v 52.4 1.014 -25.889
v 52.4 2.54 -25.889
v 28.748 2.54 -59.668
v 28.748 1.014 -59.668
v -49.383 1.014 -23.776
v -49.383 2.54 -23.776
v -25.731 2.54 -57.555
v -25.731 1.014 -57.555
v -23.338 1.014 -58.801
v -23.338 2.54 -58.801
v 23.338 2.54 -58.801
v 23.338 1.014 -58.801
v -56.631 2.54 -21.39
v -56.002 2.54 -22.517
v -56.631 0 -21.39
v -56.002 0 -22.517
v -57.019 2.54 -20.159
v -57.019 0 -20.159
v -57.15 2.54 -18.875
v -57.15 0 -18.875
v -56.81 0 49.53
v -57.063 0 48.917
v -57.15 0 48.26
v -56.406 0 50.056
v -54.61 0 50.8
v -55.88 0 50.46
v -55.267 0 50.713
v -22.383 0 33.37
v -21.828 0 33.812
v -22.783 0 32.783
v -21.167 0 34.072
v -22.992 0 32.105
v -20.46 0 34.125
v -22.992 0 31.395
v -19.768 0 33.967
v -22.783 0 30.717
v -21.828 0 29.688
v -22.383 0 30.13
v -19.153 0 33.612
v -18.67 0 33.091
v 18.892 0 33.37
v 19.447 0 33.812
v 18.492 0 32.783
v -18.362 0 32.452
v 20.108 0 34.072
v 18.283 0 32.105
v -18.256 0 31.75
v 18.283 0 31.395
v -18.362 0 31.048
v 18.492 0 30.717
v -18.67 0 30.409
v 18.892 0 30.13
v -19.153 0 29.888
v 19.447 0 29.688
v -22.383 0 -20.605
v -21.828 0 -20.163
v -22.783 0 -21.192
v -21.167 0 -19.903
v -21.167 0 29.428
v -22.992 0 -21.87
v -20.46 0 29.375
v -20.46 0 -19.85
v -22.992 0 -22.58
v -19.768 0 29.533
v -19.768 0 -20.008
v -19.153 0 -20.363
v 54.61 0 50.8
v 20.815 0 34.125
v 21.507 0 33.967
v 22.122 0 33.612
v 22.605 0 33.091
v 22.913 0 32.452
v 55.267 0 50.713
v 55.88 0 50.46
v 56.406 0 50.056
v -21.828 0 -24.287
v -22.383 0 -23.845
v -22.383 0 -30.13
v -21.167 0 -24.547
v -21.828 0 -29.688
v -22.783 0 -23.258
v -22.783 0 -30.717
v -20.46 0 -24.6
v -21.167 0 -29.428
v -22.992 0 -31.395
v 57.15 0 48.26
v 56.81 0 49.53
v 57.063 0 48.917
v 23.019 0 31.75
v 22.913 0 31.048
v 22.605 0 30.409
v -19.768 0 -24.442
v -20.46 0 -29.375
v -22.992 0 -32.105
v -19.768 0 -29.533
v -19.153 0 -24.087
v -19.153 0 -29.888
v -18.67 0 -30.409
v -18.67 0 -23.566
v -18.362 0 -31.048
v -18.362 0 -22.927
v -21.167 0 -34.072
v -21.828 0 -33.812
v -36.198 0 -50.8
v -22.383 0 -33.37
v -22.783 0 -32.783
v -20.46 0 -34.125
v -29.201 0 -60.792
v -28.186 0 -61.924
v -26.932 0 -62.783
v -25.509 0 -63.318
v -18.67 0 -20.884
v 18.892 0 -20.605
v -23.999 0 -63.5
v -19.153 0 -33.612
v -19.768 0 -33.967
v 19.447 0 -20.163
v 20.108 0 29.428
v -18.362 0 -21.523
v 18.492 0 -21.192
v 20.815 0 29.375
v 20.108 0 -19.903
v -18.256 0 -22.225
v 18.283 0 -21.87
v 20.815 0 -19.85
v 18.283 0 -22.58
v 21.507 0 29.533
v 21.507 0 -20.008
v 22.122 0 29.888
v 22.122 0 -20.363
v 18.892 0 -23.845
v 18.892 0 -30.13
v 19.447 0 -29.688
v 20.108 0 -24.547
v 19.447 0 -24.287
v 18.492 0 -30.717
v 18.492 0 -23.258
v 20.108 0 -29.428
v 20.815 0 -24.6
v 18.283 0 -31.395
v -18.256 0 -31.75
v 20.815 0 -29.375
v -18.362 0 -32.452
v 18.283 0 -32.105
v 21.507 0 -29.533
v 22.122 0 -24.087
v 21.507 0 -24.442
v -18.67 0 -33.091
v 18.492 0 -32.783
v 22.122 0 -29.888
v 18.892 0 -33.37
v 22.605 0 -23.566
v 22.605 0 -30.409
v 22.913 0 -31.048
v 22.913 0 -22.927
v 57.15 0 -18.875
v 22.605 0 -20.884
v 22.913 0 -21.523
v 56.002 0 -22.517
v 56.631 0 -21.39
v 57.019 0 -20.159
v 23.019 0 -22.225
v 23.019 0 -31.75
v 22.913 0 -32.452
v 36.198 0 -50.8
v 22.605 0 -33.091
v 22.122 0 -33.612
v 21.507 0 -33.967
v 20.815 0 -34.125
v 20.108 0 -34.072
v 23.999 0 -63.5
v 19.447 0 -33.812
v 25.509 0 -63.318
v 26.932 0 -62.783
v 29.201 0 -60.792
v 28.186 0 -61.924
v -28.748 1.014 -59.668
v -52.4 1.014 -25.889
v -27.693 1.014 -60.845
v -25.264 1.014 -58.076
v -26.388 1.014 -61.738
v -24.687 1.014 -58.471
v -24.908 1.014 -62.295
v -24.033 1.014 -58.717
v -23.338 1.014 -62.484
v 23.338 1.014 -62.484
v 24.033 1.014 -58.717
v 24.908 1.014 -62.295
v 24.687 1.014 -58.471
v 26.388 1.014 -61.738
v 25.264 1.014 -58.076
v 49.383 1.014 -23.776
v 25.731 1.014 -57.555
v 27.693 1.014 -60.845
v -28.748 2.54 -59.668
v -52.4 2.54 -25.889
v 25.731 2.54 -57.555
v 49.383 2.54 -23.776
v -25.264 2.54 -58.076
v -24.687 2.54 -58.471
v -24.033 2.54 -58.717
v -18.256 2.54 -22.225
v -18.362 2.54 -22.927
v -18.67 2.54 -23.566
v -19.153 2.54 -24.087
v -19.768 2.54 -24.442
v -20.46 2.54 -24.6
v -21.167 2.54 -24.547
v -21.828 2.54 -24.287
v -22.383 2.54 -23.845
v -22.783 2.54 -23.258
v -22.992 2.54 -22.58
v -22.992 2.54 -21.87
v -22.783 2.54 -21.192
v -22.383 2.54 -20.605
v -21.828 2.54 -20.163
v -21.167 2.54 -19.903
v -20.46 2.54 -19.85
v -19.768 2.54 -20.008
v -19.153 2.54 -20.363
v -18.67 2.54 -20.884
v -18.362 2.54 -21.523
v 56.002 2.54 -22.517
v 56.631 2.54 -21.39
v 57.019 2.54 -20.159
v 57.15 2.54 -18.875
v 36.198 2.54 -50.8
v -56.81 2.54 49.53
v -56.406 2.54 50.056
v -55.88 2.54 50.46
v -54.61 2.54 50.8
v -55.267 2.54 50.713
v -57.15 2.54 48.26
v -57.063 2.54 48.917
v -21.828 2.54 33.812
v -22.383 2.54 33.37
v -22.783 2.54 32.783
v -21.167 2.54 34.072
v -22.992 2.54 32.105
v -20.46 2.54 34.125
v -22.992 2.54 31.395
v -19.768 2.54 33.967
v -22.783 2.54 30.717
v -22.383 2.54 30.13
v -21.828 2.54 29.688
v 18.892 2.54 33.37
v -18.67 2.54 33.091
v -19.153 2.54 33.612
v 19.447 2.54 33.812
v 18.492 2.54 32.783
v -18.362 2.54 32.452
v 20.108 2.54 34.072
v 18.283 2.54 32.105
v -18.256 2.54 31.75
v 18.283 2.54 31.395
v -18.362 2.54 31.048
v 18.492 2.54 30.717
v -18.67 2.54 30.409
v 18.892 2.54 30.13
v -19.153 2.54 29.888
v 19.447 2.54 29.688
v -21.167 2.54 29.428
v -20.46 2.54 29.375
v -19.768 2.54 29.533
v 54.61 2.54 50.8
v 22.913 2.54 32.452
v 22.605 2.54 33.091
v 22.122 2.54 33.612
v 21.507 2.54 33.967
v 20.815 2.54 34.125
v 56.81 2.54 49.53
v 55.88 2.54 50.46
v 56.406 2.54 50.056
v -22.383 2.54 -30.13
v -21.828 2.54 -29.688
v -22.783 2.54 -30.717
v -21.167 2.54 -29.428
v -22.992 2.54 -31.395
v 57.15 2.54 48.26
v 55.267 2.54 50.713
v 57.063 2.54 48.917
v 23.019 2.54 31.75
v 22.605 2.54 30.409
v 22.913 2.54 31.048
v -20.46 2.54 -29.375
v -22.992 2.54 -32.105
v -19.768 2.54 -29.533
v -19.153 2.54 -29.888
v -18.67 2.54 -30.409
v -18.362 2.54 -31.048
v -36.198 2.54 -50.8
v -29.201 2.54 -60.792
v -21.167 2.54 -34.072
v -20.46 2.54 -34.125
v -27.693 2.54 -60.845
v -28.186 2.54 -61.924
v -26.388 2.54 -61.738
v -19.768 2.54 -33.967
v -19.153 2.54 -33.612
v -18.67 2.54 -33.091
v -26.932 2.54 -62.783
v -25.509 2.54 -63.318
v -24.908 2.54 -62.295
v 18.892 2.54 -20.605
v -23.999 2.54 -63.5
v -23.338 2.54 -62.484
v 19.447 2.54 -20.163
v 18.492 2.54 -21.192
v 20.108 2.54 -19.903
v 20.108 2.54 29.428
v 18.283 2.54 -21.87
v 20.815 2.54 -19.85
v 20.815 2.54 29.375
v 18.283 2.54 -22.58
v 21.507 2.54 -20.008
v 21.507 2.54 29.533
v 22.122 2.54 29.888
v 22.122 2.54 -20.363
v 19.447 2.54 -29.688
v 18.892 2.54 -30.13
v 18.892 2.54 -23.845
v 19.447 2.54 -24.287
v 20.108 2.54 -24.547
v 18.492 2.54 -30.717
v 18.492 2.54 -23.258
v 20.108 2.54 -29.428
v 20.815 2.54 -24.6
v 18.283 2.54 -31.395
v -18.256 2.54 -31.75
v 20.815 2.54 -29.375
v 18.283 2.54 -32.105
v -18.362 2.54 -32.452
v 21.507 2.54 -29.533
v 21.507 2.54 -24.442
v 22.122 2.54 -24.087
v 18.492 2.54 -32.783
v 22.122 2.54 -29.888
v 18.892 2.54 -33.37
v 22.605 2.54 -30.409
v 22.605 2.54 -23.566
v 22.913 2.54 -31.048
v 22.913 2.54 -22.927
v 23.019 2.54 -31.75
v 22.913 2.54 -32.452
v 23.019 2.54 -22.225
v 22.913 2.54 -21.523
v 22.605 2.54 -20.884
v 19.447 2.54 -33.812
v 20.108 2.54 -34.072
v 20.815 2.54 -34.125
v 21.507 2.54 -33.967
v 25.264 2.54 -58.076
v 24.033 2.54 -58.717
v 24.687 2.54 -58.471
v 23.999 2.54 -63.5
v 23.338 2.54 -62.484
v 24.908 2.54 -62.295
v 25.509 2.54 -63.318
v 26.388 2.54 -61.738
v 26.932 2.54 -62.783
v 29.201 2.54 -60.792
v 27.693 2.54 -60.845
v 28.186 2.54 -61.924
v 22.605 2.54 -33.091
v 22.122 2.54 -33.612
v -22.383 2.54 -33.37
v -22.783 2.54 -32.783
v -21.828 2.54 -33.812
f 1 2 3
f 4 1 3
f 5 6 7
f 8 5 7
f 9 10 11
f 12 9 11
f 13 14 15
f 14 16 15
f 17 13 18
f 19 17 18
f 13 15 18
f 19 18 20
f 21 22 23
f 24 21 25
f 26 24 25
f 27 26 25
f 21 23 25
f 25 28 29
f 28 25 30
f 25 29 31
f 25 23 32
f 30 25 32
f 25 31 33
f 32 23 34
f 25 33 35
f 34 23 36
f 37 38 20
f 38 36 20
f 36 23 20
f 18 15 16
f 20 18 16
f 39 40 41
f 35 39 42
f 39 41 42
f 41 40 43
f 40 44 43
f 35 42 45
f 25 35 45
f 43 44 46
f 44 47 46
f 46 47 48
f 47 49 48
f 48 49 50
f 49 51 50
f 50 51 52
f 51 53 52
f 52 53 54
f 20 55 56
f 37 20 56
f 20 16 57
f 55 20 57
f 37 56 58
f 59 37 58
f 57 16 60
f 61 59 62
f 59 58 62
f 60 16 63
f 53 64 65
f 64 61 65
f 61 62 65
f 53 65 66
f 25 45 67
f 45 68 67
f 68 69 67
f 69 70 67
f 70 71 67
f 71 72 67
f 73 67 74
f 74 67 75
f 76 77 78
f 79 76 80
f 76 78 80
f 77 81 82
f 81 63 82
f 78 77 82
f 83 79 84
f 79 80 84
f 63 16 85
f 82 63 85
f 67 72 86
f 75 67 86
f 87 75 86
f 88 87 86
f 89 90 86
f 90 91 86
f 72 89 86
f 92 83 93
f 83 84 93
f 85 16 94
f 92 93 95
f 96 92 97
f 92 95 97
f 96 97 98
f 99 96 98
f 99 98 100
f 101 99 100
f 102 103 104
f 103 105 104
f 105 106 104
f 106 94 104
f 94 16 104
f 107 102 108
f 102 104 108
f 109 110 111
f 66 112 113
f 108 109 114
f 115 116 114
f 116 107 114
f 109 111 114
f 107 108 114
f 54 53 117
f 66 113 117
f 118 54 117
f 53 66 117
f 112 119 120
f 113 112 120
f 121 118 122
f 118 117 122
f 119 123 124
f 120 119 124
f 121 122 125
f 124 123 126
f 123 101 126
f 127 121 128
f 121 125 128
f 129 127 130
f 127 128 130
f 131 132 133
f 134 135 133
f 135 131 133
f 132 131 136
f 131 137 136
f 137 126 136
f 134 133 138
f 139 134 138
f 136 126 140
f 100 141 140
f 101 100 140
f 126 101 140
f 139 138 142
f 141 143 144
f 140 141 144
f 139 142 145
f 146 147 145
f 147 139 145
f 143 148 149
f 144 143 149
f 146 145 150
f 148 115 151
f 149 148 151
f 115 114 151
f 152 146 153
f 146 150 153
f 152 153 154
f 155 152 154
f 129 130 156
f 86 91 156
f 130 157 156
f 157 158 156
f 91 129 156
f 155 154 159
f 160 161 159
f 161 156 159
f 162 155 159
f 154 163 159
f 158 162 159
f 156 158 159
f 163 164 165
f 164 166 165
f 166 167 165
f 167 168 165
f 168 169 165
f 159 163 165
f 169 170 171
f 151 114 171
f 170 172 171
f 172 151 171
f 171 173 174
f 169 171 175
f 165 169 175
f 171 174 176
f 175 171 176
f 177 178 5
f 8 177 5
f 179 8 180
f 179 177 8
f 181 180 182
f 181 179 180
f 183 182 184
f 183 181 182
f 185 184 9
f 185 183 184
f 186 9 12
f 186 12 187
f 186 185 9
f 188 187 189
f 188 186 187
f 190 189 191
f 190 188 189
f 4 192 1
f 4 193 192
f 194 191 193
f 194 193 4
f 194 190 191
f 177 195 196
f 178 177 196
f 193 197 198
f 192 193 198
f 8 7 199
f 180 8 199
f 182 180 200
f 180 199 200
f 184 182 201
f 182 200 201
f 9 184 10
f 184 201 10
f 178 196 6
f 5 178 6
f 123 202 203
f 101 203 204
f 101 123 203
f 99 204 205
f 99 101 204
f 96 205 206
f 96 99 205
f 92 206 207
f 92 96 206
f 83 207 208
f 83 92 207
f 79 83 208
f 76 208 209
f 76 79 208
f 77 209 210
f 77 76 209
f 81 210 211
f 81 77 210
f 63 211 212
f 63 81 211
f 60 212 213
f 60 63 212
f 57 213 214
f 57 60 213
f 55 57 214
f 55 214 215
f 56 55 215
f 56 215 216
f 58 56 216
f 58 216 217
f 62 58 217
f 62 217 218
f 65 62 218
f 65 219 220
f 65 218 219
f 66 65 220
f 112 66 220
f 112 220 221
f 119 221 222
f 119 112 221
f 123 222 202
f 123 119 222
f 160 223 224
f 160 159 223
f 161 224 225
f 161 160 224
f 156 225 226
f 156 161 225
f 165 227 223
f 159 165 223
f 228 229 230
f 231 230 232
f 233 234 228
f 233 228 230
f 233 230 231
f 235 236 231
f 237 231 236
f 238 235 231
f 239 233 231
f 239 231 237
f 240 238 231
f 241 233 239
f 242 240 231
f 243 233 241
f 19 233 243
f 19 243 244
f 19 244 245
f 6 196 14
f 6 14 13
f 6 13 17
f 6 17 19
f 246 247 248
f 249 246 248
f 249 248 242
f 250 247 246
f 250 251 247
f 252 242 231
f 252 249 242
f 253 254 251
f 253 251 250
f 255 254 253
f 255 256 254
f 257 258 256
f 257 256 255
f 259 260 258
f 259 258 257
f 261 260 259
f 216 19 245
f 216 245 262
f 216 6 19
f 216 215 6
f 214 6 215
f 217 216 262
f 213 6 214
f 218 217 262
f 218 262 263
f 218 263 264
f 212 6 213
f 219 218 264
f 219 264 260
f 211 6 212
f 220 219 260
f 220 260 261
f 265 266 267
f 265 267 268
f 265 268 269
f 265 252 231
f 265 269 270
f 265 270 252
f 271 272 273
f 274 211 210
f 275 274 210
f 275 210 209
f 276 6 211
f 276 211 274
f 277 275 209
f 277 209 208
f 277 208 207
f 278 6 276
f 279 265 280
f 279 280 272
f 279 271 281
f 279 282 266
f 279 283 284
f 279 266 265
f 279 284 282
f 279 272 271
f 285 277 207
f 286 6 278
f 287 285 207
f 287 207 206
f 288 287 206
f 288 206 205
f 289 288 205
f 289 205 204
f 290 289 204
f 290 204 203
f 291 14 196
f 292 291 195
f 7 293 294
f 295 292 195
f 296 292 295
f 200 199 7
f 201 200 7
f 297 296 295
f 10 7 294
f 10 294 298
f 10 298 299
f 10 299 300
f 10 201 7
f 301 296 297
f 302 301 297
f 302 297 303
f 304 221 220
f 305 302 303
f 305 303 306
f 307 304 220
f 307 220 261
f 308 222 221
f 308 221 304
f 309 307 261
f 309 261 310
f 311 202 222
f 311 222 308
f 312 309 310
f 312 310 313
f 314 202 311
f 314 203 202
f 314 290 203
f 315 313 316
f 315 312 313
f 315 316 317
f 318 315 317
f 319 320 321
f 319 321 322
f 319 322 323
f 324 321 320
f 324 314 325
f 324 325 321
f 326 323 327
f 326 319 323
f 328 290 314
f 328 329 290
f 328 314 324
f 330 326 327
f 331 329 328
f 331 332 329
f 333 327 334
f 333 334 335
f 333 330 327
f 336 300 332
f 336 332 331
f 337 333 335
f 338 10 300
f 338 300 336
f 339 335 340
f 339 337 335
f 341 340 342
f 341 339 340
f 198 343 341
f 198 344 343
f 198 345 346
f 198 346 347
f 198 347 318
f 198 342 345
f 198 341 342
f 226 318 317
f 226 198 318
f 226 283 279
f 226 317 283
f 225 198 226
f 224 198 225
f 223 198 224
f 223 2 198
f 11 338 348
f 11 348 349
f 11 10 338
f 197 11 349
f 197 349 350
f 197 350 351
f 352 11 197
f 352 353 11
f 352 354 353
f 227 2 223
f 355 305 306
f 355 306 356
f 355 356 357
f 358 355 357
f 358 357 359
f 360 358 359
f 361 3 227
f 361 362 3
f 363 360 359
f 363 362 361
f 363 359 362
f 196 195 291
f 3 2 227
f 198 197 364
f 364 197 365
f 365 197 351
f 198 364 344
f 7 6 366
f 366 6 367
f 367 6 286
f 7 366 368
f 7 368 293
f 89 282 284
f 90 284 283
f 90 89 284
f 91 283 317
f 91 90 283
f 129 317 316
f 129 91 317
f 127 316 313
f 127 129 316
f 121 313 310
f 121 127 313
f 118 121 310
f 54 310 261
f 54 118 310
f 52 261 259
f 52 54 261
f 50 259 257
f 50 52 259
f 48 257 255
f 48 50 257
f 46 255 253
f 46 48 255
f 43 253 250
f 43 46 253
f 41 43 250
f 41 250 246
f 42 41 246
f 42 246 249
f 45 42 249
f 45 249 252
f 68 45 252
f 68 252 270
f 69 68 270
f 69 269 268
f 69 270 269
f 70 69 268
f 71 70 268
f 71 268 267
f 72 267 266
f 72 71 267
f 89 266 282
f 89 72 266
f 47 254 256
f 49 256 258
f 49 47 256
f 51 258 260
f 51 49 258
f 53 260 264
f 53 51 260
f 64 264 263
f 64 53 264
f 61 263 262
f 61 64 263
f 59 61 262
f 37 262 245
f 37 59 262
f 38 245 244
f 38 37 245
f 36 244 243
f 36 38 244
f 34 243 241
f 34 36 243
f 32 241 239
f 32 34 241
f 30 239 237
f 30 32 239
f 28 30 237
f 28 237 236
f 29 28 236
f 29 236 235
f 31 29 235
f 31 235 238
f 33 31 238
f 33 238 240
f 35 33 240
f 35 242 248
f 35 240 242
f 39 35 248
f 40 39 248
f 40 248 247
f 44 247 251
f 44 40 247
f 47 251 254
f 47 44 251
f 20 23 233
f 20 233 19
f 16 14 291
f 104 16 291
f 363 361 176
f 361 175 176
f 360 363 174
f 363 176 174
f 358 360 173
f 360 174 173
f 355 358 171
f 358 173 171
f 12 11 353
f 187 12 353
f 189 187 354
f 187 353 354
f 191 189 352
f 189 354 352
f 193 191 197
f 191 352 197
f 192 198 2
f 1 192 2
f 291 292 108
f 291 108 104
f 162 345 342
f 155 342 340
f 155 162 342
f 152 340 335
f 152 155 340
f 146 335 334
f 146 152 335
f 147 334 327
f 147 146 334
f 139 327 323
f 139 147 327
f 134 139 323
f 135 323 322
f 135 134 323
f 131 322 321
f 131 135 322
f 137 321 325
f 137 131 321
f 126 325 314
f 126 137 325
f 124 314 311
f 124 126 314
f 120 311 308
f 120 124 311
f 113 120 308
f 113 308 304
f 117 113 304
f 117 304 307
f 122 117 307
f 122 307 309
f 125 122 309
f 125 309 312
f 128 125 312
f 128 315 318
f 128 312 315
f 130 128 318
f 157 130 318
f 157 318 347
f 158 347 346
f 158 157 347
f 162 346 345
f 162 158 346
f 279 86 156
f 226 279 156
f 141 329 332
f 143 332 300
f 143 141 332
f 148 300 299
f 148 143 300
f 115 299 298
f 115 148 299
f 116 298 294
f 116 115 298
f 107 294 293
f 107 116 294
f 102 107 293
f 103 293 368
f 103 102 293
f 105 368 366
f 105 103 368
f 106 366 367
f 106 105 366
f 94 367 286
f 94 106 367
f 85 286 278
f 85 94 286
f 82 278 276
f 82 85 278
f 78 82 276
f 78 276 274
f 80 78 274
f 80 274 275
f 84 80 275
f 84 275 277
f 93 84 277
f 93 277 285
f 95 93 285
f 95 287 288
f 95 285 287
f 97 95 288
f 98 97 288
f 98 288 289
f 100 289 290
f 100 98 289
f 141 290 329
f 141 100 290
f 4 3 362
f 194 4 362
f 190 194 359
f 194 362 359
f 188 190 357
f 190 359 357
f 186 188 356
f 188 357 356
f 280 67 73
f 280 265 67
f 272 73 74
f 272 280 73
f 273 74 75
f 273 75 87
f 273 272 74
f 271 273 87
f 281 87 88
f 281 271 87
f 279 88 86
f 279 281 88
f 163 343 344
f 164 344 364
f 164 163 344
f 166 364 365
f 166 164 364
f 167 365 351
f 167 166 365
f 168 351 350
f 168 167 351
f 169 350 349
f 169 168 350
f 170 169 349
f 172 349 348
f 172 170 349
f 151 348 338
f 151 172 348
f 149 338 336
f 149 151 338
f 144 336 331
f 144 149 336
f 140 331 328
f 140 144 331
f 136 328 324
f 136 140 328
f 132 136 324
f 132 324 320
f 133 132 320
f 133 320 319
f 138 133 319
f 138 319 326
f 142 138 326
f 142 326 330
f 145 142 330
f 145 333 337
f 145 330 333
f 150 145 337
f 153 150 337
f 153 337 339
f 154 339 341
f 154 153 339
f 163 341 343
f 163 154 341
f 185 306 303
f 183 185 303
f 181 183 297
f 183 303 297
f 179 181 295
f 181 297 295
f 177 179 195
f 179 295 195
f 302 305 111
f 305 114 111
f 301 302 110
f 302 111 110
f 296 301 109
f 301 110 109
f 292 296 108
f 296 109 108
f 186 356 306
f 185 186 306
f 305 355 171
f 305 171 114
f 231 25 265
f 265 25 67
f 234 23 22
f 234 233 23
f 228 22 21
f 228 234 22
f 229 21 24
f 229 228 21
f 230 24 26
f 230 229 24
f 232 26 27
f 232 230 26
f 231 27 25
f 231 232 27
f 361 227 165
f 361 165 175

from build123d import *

# Parameters (mm, degrees)
SKETCH2_W               = 114.3
SKETCH2_H               = 101.6
BOSS_EXTRUDE1_DEPTH     = 2.54
SKETCH3_W               = 19.05
SKETCH3_H               = 38.1
BOSS_EXTRUDE2_DEPTH     = 2.54
TRUCKMOUNTINGHOLES_R    = 2.38125
CUT_EXTRUDE1_DEPTH      = 6.08
FILLET1_R               = 2.54
CUT_EXTRUDE3_DEPTH      = 3.54
CUT_EXTRUDE3_DEPTH_BACK = 3.54
BOSS_EXTRUDE3_DEPTH     = 2.54
CUT_EXTRUDE4_DEPTH      = 1.525958
FILLET2_R               = 6.35
SKETCH8_W               = 22.225
SKETCH8_H               = 2.54
BOSS_EXTRUDE4_DEPTH     = 2.54
CUT_EXTRUDE5_DEPTH      = 2.54
SKETCH10_W              = 60.325
SKETCH10_H              = 101.6
CUT_EXTRUDE6_DEPTH      = 2.54


with BuildPart() as part:
    # Sketch2 → Boss-Extrude1 (new body)
    with BuildSketch(Plane(origin=(0, 0, 0), x_dir=(1, 0, 0), z_dir=(0, 1, 0))):
        Rectangle(SKETCH2_W, SKETCH2_H)
    extrude(amount=BOSS_EXTRUDE1_DEPTH)

    # Sketch3 → Boss-Extrude2 (add)
    with BuildSketch(Plane(origin=(0, 2.54, 0), x_dir=(1, 0, 0), z_dir=(0, 1, 0))):
        with Locations((-20.6375, -31.75)):
            Rectangle(SKETCH3_W, SKETCH3_H)
        with Locations((20.6375, -31.75)):
            Rectangle(SKETCH3_W, SKETCH3_H)
        Polygon((-30.1625, 41.705647627), (-30.1625, 12.7), (-11.1125, 12.7), (-11.1125, 50.8), (-23.794565913, 50.8), align=None)
        Polygon((11.1125, 50.8), (11.1125, 12.7), (30.1625, 12.7), (30.1625, 41.705647627), (23.794565913, 50.8), align=None)
    extrude(amount=BOSS_EXTRUDE2_DEPTH)

    # TruckMountingHoles → Cut-Extrude1 (cut, through all)
    with BuildSketch(Plane(origin=(0, 0, 0), x_dir=(1, 0, 0), z_dir=(0, 1, 0))):
        with Locations((-20.6375, 22.225)):
            Circle(TRUCKMOUNTINGHOLES_R)
        with Locations((-20.6375, 31.75)):
            Circle(TRUCKMOUNTINGHOLES_R)
        with Locations((20.6375, 31.75)):
            Circle(TRUCKMOUNTINGHOLES_R)
        with Locations((20.6375, 22.225)):
            Circle(TRUCKMOUNTINGHOLES_R)
        with Locations((20.6375, -31.75)):
            Circle(TRUCKMOUNTINGHOLES_R)
        with Locations((-20.6375, -31.75)):
            Circle(TRUCKMOUNTINGHOLES_R)
    extrude(amount=CUT_EXTRUDE1_DEPTH, mode=Mode.SUBTRACT)

    # Fillet1
    fillet1_edges = [part.edges().sort_by_distance(p)[0] for p in [
        (57.15, 1.27, 50.8),
        (-57.15, 1.27, 50.8),
        (-57.15, 1.27, -50.8),
        (57.15, 1.27, -50.8),
    ]]
    fillet(fillet1_edges, radius=FILLET1_R)

    # Sketch5 → Cut-Extrude3 (cut, two sides)
    with BuildSketch(Plane(origin=(0, 2.54, 0), x_dir=(1, 0, 0), z_dir=(0, 1, 0))) as cut_extrude3_sk:
        with BuildLine():
            Line((54.61, 50.8), (36.197635735, 50.8))
            Line((36.197635735, 50.8), (57.15, 20.876922739))
            Line((57.15, 20.876922739), (57.15, 48.26))
            ThreePointArc((57.15, 48.26), (56.406051224, 50.056051224), (54.61, 50.8))
        make_face()
        with BuildLine():
            Line((-57.15, 20.876922739), (-36.197635735, 50.8))
            Line((-36.197635735, 50.8), (-54.61, 50.8))
            ThreePointArc((-54.61, 50.8), (-56.406051224, 50.056051224), (-57.15, 48.26))
            Line((-57.15, 48.26), (-57.15, 20.876922739))
        make_face()
    extrude(amount=CUT_EXTRUDE3_DEPTH, mode=Mode.SUBTRACT)
    extrude(cut_extrude3_sk.sketch, amount=-CUT_EXTRUDE3_DEPTH_BACK, mode=Mode.SUBTRACT)

    # Sketch5<5> → Boss-Extrude3 (add)
    with BuildSketch(Plane(origin=(0, 2.54, 0), x_dir=(1, 0, 0), z_dir=(0, 1, 0))):
        Polygon((36.197635735, 50.8), (27.305, 63.5), (-27.305, 63.5), (-36.197635735, 50.8), (-25.500724295, 50.8), (-23.794565913, 50.8), (-11.1125, 50.8), (11.1125, 50.8), (23.794565913, 50.8), align=None)
    extrude(amount=-BOSS_EXTRUDE3_DEPTH)

    # Sketch6 → Cut-Extrude4 (cut)
    with BuildSketch(Plane(origin=(0, 2.54, 0), x_dir=(1, 0, 0), z_dir=(0, 1, 0))):
        with BuildLine():
            Line((49.383451528, 23.776246966), (52.400388507, 25.888728981))
            Line((52.400388507, 25.888728981), (28.747959175, 59.667898786))
            ThreePointArc((28.747959175, 59.667898786), (26.387666917, 61.737819542), (23.338279075, 62.484))
            Line((23.338279075, 62.484), (-23.338279075, 62.484))
            ThreePointArc((-23.338279075, 62.484), (-26.387666917, 61.737819542), (-28.747959175, 59.667898786))
            Line((-28.747959175, 59.667898786), (-52.400388507, 25.888728981))
            Line((-52.400388507, 25.888728981), (-49.383451528, 23.776246966))
            Line((-49.383451528, 23.776246966), (-25.731022196, 57.555416771))
            ThreePointArc((-25.731022196, 57.555416771), (-24.687046774, 58.470958644), (-23.338279075, 58.801))
            Line((-23.338279075, 58.801), (23.338279075, 58.801))
            ThreePointArc((23.338279075, 58.801), (24.687046774, 58.470958644), (25.731022196, 57.555416771))
            Line((25.731022196, 57.555416771), (49.383451528, 23.776246966))
        make_face()
    extrude(amount=-CUT_EXTRUDE4_DEPTH, mode=Mode.SUBTRACT)

    # Fillet2
    fillet2_edges = [part.edges().sort_by_distance(p)[0] for p in [
        (57.15, 1.27, -20.876922739),
        (-57.15, 1.27, -20.876922739),
        (-27.305, 1.27, -63.5),
        (27.305, 1.27, -63.5),
    ]]
    fillet(fillet2_edges, radius=FILLET2_R)

    # Sketch8 → Boss-Extrude4 (add)
    with BuildSketch(Plane(origin=(0, 2.54, 0), x_dir=(1, 0, 0), z_dir=(0, 1, 0))):
        with Locations((0, -49.53)):
            Rectangle(SKETCH8_W, SKETCH8_H)
    extrude(amount=BOSS_EXTRUDE4_DEPTH)

    # Sketch9 → Cut-Extrude5 (cut)
    with BuildSketch(Plane.XY.offset(50.8)):
        with BuildLine():
            Line((6.346056871, 5.08), (-6.346056871, 5.08))
            ThreePointArc((-6.346056871, 5.08), (-5.941945474, 4.247288898), (-5.08, 3.91))
            Line((-5.08, 3.91), (5.08, 3.91))
            ThreePointArc((5.08, 3.91), (5.941945474, 4.247288898), (6.346056871, 5.08))
        make_face()
    extrude(amount=-CUT_EXTRUDE5_DEPTH, mode=Mode.SUBTRACT)

    # Sketch10 → Cut-Extrude6 (cut)
    with BuildSketch(Plane(origin=(0, 5.08, 0), x_dir=(1, 0, 0), z_dir=(0, 1, 0))):
        Rectangle(SKETCH10_W, SKETCH10_H)
    extrude(amount=-CUT_EXTRUDE6_DEPTH, mode=Mode.SUBTRACT)


solid = part.part
